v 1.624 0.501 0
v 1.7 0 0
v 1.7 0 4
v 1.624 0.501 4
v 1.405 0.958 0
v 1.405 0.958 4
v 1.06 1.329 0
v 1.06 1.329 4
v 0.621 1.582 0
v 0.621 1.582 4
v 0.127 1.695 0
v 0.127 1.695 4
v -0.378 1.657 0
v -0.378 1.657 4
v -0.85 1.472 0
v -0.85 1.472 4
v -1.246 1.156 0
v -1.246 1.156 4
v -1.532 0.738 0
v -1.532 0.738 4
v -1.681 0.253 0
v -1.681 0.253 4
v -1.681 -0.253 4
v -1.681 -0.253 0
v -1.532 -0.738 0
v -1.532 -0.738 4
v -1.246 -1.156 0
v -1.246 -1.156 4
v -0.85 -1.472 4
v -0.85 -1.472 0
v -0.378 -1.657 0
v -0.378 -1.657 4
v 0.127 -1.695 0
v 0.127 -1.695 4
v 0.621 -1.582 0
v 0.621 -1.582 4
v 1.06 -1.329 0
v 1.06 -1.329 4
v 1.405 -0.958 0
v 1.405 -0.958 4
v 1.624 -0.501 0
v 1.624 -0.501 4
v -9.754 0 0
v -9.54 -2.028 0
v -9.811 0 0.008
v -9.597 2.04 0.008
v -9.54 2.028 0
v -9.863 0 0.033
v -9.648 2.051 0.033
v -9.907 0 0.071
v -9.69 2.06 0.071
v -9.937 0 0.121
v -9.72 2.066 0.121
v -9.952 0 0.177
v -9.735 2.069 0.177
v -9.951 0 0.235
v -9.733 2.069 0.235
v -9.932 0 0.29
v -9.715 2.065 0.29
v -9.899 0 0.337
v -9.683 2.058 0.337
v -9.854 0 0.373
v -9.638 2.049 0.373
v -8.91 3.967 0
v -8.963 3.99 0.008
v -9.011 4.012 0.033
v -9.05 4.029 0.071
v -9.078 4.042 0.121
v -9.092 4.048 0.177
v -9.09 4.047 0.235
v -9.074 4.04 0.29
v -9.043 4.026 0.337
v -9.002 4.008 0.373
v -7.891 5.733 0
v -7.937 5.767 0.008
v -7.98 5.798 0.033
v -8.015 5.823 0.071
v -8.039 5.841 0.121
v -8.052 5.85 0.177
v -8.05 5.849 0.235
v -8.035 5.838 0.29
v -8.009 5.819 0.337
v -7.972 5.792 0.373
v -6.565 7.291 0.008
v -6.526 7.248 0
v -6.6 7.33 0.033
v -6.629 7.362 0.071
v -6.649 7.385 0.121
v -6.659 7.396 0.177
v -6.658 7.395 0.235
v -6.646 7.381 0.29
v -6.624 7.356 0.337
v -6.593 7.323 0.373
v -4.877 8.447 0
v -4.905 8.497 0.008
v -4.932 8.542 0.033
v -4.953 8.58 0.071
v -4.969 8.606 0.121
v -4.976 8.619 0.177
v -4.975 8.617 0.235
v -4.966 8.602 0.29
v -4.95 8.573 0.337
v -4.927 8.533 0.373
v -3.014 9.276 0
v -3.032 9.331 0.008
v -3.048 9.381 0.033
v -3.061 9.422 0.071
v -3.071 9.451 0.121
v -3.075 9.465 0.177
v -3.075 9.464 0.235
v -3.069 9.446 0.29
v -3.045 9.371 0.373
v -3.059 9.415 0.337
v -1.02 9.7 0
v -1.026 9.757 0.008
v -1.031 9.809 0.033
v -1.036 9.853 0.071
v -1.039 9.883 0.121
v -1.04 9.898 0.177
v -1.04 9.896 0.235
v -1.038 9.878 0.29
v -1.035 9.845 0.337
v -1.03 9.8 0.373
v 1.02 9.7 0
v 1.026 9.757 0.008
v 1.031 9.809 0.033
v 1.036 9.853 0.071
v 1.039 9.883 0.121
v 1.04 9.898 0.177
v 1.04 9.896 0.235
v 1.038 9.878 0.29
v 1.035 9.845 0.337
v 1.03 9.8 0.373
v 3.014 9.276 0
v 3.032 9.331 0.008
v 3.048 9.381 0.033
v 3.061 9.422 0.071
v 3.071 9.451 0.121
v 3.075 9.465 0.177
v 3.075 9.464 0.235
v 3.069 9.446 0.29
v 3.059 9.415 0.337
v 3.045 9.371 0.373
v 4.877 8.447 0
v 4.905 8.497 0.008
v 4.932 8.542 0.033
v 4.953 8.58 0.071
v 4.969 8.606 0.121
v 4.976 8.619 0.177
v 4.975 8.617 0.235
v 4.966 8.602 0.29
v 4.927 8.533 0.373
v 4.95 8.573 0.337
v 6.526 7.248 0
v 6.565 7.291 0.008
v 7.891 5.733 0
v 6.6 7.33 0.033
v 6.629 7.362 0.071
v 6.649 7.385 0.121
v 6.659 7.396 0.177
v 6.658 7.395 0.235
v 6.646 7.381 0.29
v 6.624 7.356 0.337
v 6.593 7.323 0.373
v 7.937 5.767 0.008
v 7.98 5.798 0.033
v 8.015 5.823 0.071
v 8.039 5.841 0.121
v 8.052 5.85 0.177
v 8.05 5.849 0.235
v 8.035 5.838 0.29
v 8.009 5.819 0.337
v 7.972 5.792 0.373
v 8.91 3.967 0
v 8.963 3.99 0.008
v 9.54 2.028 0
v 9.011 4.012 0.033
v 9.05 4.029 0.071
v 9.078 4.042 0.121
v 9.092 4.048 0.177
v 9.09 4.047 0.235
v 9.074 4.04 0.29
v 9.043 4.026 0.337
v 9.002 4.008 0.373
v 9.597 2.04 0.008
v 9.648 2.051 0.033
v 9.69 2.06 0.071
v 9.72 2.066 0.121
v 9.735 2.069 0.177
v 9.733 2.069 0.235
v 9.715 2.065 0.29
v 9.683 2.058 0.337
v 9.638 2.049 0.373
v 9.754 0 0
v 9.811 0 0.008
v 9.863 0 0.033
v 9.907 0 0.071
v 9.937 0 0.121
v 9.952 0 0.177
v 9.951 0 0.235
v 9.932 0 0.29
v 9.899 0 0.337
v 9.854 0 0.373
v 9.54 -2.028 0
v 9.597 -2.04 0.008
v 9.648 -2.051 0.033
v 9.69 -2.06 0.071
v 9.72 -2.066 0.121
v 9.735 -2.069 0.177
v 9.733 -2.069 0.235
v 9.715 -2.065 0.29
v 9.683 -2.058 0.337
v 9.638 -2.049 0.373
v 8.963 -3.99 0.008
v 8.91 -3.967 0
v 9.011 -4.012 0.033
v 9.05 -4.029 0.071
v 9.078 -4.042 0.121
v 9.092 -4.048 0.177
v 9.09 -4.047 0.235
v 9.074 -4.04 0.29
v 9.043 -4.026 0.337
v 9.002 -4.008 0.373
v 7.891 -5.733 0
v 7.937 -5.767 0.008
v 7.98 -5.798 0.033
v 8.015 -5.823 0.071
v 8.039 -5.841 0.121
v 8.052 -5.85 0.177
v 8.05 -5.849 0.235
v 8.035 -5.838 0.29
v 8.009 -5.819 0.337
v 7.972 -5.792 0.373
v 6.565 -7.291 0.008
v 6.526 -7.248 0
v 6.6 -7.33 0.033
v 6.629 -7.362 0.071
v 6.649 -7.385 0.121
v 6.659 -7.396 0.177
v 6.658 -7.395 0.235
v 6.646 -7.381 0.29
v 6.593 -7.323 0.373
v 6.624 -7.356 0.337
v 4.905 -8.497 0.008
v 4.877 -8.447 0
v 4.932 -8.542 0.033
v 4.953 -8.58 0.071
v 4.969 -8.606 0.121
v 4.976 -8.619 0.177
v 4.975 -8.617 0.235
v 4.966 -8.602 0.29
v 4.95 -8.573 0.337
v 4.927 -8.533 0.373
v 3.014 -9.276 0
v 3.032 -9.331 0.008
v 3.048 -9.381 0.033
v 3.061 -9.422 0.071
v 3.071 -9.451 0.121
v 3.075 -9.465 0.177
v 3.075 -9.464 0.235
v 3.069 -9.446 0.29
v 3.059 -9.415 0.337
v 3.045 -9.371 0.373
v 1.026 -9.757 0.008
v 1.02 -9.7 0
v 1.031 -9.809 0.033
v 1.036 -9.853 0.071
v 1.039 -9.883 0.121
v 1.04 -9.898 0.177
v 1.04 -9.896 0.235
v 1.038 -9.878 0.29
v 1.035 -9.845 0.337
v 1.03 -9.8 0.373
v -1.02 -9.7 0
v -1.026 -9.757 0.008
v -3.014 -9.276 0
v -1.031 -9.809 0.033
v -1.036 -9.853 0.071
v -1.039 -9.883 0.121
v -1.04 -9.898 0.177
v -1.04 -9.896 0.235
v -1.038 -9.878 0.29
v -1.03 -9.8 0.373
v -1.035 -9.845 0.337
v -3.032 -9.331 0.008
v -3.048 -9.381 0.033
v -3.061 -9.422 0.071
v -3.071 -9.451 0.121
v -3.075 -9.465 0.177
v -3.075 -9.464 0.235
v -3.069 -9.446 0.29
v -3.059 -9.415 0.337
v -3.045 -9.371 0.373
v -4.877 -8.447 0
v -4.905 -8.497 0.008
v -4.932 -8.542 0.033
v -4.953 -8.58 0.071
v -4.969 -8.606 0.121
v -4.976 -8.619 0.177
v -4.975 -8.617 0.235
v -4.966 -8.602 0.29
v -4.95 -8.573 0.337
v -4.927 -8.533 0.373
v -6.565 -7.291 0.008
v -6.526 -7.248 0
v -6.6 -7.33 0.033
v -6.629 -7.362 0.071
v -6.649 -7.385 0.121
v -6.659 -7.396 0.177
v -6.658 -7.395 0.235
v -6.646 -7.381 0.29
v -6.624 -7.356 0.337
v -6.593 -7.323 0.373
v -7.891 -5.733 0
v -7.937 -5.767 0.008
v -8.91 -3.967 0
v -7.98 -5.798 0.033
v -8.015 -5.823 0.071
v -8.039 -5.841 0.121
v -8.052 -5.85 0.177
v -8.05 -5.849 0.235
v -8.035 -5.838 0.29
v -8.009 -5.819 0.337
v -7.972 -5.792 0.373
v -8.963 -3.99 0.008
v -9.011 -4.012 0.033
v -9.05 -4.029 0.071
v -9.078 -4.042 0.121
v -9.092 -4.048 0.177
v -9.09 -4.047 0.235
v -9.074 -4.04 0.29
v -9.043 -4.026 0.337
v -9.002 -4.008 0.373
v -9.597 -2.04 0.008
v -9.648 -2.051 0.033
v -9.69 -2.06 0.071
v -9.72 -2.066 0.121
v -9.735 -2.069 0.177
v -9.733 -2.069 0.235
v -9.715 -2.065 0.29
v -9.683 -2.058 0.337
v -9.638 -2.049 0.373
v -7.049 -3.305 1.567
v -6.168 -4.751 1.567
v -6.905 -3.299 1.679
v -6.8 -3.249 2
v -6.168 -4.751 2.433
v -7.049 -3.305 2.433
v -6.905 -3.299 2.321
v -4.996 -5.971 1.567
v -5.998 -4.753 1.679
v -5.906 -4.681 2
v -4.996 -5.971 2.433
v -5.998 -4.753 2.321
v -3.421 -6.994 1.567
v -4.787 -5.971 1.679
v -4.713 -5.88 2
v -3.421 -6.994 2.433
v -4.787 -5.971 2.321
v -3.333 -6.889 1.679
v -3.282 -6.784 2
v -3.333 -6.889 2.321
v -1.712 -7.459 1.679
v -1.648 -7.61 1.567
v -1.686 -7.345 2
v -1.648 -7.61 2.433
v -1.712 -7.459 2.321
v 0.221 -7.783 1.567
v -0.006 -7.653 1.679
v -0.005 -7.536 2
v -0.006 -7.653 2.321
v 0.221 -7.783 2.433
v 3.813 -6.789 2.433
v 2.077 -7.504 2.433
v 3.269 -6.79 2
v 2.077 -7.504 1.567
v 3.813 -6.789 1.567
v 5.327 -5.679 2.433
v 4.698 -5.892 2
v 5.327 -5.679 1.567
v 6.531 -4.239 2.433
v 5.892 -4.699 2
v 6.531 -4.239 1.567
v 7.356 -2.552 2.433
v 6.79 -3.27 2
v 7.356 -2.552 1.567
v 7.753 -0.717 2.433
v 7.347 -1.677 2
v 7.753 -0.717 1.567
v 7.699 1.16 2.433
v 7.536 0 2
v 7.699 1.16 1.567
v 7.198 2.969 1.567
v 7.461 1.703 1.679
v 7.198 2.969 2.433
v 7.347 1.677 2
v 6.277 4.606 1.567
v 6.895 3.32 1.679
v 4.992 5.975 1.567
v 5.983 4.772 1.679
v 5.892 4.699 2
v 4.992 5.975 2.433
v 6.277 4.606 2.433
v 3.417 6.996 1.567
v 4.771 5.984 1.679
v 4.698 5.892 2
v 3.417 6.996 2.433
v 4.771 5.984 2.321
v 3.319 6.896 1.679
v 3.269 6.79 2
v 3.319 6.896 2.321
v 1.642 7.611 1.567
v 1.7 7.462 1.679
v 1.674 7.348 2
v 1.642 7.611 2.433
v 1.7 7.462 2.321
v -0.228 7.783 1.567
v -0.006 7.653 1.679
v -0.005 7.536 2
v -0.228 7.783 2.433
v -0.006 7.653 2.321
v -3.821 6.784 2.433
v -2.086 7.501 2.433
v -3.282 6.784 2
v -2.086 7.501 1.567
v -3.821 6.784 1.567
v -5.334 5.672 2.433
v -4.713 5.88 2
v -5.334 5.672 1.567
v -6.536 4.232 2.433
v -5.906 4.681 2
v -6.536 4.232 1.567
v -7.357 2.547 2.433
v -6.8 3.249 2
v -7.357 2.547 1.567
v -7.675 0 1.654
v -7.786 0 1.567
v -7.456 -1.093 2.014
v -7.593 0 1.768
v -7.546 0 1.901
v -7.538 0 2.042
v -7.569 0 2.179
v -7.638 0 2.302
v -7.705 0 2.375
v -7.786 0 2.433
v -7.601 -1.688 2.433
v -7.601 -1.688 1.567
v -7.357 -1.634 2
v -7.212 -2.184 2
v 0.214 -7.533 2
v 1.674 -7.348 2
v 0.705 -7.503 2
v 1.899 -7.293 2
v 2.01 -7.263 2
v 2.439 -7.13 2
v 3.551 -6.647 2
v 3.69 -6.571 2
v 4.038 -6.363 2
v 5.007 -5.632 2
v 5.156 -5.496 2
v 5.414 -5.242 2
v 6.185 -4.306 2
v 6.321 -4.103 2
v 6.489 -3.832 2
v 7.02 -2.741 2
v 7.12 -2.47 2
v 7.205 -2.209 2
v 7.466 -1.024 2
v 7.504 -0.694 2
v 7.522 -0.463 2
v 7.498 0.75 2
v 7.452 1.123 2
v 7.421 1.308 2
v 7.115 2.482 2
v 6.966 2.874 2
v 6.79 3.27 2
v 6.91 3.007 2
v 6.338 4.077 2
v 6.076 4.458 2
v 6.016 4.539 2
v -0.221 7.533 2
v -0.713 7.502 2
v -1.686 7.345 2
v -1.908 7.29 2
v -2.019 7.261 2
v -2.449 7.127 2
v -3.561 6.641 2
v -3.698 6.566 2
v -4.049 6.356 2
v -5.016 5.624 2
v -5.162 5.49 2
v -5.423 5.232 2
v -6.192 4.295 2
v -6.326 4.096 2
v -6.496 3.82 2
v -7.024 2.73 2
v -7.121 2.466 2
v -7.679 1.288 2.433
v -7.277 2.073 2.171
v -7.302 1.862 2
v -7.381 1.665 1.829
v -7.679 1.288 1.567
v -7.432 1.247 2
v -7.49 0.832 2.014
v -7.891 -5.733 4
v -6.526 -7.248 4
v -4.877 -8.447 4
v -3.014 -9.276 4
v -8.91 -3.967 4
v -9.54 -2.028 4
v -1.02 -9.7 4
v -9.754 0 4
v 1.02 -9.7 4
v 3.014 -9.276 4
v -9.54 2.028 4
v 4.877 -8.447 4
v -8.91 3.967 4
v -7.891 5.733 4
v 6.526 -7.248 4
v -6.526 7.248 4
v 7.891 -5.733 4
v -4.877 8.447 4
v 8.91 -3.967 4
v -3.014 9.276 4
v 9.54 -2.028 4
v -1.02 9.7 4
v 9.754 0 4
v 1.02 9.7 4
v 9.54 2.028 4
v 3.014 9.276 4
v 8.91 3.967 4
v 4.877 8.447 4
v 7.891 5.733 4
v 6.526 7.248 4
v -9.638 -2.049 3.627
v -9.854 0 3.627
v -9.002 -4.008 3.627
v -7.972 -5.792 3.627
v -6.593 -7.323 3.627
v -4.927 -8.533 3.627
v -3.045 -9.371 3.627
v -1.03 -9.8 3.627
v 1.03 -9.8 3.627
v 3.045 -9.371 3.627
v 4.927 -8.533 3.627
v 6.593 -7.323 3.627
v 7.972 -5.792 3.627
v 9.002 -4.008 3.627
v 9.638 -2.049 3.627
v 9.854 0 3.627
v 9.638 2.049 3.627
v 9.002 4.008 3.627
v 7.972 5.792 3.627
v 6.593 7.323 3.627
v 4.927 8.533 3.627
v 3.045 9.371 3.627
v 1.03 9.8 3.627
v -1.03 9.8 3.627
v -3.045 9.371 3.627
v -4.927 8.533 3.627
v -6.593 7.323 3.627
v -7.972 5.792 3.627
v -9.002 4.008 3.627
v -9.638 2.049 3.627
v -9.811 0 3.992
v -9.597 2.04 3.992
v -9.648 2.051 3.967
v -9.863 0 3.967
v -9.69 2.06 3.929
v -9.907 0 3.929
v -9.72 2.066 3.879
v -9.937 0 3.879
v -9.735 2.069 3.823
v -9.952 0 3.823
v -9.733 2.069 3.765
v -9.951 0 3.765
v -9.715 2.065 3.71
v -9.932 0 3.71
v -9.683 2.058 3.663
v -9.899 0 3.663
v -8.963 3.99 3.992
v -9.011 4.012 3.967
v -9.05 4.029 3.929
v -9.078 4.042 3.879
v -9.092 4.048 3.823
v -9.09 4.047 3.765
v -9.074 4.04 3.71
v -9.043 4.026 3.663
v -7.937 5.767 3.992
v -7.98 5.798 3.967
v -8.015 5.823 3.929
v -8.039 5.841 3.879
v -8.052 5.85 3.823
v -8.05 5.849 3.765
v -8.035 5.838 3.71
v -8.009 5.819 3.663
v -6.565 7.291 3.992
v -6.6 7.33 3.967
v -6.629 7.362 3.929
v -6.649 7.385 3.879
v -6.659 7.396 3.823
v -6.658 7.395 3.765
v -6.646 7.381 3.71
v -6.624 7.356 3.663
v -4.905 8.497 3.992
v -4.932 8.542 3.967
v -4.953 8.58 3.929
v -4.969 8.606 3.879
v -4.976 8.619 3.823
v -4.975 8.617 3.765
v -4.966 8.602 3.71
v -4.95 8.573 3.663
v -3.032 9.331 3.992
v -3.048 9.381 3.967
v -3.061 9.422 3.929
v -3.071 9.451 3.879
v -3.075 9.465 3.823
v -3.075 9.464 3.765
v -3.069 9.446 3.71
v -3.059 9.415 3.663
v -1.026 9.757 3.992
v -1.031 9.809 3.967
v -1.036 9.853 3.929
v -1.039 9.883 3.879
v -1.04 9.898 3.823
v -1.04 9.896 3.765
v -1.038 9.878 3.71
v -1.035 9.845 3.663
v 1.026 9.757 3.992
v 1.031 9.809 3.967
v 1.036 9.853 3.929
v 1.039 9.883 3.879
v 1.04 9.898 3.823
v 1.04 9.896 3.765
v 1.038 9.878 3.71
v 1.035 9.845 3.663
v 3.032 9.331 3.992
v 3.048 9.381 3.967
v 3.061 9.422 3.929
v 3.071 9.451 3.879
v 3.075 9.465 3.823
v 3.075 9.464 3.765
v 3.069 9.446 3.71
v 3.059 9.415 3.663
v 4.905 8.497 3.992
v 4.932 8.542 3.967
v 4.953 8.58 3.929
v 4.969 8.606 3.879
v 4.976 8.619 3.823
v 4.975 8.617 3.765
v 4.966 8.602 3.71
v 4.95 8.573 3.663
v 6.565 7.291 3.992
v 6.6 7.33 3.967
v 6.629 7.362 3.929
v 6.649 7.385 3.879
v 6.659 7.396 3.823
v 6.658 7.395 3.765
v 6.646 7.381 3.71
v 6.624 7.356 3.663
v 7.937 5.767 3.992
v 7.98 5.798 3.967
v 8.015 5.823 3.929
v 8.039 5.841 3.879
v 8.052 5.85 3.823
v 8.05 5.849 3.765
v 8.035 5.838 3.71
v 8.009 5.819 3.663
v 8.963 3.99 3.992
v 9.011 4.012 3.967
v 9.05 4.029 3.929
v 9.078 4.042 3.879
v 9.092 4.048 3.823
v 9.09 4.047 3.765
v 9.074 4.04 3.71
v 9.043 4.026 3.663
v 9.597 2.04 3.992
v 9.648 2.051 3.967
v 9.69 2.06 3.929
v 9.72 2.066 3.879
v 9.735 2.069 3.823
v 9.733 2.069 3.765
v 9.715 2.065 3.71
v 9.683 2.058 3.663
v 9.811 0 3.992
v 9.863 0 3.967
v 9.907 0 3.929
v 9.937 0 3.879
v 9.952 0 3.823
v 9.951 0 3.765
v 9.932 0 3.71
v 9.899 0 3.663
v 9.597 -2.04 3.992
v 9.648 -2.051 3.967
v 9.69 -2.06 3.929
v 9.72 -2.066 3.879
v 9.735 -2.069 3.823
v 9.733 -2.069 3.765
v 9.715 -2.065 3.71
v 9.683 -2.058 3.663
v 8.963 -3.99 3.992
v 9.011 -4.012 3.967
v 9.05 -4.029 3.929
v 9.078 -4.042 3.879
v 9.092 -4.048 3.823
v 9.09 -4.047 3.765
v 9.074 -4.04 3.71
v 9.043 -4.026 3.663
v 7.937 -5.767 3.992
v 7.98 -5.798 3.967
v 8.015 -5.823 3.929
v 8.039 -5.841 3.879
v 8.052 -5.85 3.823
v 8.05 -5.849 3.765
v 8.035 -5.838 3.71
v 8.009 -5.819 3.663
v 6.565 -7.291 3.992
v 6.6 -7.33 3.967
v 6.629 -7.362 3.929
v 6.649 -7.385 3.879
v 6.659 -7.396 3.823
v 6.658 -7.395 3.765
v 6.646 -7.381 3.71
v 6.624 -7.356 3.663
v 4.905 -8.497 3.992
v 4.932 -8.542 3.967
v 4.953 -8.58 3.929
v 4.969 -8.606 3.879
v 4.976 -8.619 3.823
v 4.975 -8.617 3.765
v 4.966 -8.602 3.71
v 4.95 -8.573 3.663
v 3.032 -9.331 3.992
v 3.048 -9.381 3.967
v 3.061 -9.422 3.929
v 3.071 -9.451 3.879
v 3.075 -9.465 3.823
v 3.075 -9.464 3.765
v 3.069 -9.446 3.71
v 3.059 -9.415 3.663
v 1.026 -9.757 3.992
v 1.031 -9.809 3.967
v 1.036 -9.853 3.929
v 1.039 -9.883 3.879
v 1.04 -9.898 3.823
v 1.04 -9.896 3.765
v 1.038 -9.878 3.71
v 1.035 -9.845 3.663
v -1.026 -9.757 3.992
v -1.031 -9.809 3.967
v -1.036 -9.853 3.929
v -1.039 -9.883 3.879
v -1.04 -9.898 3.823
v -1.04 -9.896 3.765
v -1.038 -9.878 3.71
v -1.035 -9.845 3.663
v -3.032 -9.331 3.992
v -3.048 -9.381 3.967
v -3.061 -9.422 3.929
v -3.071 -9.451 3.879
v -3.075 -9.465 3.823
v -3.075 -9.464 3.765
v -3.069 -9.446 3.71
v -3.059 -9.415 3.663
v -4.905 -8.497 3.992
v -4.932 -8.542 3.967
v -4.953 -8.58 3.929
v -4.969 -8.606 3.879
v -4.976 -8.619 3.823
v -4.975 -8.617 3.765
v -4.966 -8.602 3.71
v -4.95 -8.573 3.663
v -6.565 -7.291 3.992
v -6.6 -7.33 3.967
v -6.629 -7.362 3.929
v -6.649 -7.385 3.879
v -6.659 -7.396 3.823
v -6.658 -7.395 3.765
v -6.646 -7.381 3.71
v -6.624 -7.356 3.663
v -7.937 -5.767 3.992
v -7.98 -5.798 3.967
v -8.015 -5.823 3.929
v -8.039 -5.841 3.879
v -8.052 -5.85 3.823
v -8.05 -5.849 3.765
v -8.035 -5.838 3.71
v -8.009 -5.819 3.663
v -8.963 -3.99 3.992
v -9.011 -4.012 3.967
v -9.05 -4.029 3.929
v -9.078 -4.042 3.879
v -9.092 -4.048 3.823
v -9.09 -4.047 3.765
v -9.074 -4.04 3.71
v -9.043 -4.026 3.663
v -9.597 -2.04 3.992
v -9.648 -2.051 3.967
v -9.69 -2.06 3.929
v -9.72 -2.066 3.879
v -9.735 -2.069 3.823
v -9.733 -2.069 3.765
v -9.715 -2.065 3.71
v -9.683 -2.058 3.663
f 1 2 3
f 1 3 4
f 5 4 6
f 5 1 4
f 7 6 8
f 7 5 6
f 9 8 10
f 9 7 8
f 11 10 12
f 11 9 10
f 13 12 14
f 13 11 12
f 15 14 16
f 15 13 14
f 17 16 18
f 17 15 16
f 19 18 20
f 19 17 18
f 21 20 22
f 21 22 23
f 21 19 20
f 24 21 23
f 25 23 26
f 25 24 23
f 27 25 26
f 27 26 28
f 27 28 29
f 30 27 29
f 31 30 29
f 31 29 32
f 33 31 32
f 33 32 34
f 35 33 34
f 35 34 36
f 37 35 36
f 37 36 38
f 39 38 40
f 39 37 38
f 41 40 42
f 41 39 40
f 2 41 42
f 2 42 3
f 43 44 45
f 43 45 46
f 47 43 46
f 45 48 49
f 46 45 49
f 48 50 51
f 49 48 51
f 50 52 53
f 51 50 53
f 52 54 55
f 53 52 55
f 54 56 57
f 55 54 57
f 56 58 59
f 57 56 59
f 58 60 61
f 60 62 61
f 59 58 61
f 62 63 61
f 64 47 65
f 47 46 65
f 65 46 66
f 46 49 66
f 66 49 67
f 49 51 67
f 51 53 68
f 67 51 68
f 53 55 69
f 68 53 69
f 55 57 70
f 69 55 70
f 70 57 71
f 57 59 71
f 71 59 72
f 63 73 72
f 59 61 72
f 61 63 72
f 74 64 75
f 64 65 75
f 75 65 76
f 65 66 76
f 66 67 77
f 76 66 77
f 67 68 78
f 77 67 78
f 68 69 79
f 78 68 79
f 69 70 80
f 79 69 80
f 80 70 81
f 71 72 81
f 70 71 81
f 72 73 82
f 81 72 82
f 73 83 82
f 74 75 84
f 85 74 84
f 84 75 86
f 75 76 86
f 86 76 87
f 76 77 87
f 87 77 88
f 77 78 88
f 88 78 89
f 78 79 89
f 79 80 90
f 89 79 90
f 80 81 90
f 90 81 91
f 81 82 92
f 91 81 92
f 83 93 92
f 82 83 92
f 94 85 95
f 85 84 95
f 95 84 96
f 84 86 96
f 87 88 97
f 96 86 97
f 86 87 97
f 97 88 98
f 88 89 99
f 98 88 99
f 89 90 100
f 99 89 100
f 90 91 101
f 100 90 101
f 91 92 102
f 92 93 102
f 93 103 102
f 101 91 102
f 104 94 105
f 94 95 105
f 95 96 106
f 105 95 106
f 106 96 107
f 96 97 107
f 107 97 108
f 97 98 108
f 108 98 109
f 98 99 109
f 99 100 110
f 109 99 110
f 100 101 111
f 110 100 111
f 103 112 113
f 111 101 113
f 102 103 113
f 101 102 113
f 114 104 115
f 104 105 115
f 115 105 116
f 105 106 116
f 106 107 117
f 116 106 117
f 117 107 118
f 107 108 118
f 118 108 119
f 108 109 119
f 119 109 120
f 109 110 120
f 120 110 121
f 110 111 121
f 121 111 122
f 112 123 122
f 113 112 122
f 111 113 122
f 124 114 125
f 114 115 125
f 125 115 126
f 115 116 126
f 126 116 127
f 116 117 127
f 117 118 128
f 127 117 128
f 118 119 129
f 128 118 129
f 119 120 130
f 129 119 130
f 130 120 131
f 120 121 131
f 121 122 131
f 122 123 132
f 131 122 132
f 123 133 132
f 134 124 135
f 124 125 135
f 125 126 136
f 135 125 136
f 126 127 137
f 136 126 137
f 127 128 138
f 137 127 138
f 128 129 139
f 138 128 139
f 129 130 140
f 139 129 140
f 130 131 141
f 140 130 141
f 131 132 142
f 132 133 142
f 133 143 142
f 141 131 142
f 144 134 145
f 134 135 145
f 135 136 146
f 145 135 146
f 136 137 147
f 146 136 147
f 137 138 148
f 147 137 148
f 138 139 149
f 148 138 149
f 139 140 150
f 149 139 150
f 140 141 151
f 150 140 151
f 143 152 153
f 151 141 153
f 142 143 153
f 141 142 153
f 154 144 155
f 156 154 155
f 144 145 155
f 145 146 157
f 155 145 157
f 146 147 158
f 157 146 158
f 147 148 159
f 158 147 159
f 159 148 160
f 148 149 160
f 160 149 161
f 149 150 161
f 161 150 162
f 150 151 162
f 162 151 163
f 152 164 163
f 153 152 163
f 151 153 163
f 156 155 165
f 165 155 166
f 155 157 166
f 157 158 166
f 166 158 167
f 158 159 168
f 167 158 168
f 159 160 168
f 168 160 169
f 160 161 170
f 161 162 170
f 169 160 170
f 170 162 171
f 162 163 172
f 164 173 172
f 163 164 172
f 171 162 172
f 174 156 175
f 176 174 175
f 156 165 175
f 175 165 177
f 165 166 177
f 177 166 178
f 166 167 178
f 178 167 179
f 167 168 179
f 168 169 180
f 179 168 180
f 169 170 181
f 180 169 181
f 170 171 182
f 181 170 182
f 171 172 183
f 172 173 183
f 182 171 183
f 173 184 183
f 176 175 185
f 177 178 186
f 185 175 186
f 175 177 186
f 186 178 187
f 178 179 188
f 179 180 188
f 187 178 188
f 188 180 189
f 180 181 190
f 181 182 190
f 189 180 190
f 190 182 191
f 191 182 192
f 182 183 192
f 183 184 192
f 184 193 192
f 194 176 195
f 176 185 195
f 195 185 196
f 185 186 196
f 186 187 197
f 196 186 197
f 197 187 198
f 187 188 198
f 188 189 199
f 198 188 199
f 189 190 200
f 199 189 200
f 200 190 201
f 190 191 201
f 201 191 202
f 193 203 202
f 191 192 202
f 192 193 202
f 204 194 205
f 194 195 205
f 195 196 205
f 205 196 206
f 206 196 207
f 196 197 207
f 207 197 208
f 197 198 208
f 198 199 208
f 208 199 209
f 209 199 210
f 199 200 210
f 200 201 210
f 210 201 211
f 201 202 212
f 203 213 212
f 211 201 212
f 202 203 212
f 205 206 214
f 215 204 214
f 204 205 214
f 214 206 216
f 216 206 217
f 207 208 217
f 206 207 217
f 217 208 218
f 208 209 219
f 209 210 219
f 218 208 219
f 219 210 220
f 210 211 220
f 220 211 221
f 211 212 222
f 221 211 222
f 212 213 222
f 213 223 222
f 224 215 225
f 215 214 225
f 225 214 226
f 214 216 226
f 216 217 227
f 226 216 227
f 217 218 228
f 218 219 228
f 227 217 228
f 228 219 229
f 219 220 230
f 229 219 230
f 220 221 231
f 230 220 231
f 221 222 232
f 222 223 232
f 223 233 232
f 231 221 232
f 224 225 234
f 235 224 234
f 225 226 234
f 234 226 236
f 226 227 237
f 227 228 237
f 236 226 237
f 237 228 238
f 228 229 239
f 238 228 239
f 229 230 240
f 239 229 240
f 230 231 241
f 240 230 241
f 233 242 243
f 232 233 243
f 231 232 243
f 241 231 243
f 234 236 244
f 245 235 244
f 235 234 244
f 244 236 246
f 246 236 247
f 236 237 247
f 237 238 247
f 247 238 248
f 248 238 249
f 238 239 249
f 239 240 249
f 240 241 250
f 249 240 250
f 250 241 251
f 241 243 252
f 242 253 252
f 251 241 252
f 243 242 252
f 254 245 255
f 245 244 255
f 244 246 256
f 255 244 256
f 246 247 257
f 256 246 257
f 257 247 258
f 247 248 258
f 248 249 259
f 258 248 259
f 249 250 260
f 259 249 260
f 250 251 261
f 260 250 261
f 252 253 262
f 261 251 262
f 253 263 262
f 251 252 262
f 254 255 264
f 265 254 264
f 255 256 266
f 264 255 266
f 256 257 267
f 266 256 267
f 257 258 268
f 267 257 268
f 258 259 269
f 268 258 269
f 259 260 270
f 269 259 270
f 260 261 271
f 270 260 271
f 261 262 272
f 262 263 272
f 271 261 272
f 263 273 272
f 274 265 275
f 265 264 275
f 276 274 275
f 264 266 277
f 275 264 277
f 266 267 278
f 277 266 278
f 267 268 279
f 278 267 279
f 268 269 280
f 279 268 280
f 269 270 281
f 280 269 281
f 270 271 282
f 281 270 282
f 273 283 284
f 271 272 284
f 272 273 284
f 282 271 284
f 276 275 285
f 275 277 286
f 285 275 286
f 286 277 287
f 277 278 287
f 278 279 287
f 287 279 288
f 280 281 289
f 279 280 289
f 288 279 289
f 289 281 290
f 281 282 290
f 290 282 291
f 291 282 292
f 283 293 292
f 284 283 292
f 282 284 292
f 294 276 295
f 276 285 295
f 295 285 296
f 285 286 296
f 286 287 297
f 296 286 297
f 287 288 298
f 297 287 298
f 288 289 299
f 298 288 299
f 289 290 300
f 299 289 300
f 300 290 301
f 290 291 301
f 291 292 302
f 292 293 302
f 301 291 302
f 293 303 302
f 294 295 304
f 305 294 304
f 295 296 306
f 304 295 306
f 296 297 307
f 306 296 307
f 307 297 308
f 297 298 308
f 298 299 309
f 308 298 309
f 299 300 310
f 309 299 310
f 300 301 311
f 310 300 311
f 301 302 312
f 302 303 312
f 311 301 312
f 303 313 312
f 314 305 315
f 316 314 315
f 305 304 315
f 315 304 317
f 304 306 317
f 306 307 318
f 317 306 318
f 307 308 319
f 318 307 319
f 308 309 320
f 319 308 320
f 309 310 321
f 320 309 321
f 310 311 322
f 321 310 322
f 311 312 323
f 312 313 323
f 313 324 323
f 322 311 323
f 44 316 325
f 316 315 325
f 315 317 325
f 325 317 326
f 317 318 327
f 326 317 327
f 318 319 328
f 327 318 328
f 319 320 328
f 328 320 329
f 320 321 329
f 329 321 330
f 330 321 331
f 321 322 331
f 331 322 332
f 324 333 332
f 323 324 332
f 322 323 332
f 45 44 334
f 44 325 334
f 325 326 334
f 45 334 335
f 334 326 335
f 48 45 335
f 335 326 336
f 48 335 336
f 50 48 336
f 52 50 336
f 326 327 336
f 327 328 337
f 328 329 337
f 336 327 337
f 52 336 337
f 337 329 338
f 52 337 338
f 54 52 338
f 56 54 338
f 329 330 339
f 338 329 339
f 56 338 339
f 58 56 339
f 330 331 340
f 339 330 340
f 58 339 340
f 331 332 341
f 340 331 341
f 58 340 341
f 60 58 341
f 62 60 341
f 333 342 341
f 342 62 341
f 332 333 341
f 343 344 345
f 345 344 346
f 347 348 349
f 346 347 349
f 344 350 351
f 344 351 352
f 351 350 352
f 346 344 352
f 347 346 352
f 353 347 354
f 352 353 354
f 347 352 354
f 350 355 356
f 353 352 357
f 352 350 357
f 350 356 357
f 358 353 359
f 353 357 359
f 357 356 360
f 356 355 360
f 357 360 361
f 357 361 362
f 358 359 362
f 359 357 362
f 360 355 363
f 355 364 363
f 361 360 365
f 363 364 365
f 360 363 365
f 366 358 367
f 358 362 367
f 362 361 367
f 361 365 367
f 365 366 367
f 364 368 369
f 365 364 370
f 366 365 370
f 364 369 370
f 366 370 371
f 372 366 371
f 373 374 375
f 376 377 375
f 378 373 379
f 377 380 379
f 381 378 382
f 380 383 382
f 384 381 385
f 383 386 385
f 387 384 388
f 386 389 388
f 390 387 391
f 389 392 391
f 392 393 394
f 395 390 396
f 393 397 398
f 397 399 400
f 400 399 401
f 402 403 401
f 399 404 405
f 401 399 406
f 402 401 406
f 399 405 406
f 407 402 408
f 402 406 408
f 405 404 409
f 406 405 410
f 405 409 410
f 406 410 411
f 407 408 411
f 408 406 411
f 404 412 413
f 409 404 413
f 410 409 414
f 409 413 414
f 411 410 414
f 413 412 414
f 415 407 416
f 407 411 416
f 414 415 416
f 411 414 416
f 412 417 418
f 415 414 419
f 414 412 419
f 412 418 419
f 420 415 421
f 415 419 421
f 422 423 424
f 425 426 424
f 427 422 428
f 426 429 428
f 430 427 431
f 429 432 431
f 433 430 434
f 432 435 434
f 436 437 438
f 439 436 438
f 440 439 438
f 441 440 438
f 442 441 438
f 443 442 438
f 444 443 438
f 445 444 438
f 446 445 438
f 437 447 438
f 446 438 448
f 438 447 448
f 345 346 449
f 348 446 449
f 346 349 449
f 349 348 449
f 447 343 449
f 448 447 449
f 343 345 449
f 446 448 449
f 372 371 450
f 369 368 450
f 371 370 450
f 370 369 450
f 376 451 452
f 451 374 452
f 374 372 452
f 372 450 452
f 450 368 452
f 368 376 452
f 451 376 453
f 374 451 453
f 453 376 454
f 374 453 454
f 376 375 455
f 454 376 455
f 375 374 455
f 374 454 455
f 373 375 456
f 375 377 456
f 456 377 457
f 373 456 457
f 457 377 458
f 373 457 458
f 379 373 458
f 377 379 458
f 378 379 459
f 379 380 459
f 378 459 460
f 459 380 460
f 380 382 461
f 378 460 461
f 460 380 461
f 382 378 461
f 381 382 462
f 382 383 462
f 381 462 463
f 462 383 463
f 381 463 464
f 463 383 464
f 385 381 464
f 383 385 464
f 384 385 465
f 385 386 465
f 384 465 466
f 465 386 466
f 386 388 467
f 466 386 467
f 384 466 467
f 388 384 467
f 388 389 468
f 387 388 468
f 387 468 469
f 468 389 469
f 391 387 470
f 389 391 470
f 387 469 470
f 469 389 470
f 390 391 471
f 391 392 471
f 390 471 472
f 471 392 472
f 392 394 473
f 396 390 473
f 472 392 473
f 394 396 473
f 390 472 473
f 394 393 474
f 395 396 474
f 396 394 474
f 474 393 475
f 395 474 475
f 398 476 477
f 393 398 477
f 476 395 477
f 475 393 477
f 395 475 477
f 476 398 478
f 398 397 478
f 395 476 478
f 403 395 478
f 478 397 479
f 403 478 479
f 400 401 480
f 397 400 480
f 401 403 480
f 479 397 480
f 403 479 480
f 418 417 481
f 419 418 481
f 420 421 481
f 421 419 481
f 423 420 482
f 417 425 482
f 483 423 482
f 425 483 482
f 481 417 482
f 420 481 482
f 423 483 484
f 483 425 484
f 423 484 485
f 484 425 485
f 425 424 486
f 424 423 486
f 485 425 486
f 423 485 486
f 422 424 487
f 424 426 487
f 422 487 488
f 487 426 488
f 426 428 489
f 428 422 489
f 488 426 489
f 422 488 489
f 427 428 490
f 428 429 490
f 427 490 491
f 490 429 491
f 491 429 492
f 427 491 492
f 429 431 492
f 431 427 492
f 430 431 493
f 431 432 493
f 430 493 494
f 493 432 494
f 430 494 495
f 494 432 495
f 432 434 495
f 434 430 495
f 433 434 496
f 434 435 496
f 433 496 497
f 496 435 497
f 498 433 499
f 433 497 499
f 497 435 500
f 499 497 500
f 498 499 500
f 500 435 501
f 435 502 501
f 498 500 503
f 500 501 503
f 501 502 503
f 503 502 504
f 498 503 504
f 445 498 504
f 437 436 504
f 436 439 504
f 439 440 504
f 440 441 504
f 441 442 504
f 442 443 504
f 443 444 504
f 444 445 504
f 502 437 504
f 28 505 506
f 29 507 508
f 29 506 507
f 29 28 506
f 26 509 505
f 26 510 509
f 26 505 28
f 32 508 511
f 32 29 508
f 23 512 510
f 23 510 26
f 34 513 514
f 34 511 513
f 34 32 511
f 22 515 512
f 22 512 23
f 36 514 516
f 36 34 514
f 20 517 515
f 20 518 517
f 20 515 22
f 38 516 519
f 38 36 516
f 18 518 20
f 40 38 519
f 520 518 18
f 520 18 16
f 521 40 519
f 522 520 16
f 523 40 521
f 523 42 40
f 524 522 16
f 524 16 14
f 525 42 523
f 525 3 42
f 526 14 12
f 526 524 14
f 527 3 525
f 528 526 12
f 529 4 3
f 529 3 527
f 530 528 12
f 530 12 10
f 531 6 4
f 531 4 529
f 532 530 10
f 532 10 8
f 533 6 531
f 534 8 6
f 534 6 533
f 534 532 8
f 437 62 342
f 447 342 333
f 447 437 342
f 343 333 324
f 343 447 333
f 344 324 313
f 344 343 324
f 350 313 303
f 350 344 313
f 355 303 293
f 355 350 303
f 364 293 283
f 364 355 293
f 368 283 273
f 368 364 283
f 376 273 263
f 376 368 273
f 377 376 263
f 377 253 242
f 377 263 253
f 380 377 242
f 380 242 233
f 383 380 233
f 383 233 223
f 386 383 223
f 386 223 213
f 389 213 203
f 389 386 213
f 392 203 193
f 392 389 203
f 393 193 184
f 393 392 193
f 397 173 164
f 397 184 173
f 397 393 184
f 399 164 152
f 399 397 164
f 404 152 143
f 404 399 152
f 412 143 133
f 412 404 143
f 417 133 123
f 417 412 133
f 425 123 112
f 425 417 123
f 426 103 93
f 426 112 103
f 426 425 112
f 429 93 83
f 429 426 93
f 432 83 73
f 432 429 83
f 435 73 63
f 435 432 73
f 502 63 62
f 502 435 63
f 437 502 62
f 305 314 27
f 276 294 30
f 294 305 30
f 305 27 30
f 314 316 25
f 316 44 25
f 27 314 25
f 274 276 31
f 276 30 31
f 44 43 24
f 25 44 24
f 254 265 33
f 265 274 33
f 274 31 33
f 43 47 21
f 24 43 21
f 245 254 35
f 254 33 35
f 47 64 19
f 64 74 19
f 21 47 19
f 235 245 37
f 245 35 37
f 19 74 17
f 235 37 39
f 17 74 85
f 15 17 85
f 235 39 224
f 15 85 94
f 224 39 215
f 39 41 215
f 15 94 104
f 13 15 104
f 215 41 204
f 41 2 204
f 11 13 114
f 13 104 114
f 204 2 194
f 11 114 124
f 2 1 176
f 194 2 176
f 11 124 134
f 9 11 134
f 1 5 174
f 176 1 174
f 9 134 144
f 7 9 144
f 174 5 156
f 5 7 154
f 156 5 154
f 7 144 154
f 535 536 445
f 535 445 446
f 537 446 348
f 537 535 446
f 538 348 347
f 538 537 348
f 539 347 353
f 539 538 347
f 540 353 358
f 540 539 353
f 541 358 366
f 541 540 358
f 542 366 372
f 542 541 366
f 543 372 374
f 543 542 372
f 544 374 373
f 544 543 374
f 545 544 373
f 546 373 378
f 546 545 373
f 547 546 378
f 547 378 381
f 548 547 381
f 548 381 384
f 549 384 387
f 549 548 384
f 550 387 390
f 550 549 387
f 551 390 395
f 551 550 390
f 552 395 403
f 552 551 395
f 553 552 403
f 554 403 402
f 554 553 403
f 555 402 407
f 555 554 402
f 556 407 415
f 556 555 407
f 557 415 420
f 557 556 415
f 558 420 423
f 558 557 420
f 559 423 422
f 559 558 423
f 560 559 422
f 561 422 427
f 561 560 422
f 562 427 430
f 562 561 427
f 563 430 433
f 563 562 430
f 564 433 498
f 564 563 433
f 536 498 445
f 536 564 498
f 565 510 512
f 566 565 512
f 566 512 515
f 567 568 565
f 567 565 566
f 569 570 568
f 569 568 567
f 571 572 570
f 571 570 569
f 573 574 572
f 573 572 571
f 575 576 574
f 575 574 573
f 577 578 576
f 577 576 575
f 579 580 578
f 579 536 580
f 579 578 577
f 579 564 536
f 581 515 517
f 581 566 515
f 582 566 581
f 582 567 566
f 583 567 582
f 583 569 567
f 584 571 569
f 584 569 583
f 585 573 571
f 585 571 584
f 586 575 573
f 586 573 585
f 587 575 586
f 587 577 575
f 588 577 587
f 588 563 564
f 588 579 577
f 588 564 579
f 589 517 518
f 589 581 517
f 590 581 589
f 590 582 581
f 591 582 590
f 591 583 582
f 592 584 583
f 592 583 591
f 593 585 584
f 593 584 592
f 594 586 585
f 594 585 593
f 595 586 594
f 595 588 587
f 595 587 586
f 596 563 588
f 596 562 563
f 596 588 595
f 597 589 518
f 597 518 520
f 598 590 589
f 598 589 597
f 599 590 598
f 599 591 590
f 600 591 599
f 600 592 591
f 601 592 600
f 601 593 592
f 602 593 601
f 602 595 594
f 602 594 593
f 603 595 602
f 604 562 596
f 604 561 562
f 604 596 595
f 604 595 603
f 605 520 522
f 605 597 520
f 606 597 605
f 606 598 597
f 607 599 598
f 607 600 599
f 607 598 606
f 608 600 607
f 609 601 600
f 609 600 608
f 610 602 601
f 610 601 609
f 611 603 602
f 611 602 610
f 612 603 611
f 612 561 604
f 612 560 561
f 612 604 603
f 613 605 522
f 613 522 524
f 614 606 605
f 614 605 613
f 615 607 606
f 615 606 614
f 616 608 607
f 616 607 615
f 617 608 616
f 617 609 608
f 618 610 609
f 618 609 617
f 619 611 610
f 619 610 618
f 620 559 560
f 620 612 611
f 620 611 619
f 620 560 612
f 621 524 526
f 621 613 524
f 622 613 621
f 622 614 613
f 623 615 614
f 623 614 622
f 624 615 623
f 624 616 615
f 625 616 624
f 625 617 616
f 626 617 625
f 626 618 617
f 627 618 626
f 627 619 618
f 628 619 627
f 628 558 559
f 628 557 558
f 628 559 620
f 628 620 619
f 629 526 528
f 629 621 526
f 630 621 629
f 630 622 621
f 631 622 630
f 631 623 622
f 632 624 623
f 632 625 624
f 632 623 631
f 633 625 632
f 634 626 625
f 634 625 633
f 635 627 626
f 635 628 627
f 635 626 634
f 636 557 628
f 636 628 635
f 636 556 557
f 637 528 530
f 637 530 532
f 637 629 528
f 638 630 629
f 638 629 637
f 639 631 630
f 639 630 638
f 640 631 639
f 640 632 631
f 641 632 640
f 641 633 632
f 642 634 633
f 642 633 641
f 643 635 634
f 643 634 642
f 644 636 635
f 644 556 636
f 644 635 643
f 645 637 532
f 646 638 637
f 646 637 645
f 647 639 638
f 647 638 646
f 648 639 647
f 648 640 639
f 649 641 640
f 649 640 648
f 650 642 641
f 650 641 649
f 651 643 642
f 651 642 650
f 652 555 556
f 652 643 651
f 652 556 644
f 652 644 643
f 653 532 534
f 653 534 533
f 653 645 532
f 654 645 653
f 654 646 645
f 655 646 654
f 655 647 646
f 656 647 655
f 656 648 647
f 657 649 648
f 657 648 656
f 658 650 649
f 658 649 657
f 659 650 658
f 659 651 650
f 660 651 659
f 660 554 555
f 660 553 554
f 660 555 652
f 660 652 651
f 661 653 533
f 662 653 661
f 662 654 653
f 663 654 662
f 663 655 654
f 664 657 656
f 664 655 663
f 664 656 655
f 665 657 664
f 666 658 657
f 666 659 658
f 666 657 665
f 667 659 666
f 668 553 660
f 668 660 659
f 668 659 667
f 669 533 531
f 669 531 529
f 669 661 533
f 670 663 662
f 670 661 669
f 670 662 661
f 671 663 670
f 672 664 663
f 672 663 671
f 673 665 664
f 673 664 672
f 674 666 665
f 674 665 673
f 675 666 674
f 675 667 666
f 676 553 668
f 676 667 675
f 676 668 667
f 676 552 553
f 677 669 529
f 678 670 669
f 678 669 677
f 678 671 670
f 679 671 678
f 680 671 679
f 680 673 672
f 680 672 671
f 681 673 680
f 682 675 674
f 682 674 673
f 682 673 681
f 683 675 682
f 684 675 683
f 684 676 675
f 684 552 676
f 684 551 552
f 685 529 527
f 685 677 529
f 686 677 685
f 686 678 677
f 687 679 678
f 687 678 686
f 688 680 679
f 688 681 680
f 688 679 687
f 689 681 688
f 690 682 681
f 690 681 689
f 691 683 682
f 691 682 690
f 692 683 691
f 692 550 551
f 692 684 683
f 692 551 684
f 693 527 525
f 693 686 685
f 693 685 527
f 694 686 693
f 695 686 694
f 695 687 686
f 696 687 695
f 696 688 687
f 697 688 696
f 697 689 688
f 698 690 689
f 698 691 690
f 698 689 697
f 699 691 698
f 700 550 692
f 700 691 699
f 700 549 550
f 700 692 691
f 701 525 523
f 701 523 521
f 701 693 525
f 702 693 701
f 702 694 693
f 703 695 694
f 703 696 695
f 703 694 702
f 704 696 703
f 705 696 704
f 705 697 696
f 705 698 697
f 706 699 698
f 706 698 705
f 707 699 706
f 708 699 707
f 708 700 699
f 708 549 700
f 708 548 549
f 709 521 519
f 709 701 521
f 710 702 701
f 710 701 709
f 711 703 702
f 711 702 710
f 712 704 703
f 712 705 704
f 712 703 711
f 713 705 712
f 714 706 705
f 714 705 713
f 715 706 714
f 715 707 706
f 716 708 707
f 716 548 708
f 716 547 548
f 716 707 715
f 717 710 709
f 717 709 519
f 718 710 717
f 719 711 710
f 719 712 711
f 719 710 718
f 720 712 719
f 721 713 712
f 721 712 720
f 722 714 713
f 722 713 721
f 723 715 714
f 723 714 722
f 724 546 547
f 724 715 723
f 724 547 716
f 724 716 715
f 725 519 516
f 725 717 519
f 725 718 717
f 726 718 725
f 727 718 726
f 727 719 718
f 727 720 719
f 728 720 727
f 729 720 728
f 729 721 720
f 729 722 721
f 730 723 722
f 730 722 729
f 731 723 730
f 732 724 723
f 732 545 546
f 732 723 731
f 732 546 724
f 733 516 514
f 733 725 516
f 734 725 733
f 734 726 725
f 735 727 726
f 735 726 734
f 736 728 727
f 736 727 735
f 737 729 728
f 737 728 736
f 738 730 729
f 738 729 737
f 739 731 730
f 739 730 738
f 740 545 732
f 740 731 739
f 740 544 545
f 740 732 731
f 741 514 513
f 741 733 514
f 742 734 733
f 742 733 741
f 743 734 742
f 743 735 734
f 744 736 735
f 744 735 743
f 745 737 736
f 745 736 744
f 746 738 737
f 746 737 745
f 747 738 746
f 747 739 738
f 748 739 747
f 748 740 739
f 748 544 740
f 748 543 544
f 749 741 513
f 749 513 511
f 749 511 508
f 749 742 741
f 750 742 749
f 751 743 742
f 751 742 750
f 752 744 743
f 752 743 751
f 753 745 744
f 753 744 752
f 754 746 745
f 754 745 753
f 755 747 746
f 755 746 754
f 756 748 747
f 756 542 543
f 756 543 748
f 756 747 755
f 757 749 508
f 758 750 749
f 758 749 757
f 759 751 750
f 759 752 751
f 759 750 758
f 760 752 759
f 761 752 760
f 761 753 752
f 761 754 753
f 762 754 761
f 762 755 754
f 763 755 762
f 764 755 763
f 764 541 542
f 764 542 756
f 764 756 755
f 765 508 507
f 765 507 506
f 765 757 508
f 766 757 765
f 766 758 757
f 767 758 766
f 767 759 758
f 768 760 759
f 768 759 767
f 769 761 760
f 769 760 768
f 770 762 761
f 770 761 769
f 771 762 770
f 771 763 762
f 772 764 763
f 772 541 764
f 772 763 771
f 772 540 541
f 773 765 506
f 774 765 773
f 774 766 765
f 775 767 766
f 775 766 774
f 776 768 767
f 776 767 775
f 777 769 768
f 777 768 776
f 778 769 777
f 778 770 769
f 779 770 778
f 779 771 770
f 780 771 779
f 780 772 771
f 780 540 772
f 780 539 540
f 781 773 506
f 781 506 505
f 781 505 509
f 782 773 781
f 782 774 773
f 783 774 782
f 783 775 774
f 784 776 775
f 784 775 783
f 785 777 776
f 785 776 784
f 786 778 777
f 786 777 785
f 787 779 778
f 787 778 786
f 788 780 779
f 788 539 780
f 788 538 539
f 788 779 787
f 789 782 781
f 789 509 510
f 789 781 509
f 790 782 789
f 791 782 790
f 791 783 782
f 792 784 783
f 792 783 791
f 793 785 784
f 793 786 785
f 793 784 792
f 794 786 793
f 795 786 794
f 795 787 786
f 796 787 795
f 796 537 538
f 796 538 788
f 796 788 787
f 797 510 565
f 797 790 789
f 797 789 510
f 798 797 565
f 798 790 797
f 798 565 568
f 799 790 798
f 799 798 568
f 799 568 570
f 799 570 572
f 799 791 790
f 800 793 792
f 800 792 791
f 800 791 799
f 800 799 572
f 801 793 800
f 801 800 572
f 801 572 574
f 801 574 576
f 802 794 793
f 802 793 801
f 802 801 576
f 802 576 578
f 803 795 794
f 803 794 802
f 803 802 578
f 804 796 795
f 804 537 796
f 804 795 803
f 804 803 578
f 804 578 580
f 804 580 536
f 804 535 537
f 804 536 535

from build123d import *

# Parameters (mm, degrees)
F0_R     = 10.5
F0_R_2   = 1.7
F1_DEPTH = 4
F4_R     = 0.2
F5_R     = 0.5


with BuildPart() as f1:
    # F0 (on Top) → F1 (new body)
    with BuildSketch(Plane.XY):
        Circle(F0_R)
        Circle(F0_R_2, mode=Mode.SUBTRACT)
    extrude(amount=F1_DEPTH)

    # F2 (on Front) → F3 (revolve, cut)
    with BuildSketch(Plane.XZ):
        Polygon((-10.5, 4), (-10.5, 0), (-7.035898, 2), align=None)
    revolve(axis=Axis((0, 0, 4), (0, 0, 1)), mode=Mode.SUBTRACT)

    # F4
    f4_edges = [f1.edges().sort_by_distance(p)[0] for p in [
        (10.5, 0, 4),
        (10.5, 0, 0),
    ]]
    fillet(f4_edges, radius=F4_R)

    # F5
    f5_edges = [f1.edges().sort_by_distance(p)[0] for p in [
        (7.035898, 0, 2),
    ]]
    fillet(f5_edges, radius=F5_R)


solid = f1.part
